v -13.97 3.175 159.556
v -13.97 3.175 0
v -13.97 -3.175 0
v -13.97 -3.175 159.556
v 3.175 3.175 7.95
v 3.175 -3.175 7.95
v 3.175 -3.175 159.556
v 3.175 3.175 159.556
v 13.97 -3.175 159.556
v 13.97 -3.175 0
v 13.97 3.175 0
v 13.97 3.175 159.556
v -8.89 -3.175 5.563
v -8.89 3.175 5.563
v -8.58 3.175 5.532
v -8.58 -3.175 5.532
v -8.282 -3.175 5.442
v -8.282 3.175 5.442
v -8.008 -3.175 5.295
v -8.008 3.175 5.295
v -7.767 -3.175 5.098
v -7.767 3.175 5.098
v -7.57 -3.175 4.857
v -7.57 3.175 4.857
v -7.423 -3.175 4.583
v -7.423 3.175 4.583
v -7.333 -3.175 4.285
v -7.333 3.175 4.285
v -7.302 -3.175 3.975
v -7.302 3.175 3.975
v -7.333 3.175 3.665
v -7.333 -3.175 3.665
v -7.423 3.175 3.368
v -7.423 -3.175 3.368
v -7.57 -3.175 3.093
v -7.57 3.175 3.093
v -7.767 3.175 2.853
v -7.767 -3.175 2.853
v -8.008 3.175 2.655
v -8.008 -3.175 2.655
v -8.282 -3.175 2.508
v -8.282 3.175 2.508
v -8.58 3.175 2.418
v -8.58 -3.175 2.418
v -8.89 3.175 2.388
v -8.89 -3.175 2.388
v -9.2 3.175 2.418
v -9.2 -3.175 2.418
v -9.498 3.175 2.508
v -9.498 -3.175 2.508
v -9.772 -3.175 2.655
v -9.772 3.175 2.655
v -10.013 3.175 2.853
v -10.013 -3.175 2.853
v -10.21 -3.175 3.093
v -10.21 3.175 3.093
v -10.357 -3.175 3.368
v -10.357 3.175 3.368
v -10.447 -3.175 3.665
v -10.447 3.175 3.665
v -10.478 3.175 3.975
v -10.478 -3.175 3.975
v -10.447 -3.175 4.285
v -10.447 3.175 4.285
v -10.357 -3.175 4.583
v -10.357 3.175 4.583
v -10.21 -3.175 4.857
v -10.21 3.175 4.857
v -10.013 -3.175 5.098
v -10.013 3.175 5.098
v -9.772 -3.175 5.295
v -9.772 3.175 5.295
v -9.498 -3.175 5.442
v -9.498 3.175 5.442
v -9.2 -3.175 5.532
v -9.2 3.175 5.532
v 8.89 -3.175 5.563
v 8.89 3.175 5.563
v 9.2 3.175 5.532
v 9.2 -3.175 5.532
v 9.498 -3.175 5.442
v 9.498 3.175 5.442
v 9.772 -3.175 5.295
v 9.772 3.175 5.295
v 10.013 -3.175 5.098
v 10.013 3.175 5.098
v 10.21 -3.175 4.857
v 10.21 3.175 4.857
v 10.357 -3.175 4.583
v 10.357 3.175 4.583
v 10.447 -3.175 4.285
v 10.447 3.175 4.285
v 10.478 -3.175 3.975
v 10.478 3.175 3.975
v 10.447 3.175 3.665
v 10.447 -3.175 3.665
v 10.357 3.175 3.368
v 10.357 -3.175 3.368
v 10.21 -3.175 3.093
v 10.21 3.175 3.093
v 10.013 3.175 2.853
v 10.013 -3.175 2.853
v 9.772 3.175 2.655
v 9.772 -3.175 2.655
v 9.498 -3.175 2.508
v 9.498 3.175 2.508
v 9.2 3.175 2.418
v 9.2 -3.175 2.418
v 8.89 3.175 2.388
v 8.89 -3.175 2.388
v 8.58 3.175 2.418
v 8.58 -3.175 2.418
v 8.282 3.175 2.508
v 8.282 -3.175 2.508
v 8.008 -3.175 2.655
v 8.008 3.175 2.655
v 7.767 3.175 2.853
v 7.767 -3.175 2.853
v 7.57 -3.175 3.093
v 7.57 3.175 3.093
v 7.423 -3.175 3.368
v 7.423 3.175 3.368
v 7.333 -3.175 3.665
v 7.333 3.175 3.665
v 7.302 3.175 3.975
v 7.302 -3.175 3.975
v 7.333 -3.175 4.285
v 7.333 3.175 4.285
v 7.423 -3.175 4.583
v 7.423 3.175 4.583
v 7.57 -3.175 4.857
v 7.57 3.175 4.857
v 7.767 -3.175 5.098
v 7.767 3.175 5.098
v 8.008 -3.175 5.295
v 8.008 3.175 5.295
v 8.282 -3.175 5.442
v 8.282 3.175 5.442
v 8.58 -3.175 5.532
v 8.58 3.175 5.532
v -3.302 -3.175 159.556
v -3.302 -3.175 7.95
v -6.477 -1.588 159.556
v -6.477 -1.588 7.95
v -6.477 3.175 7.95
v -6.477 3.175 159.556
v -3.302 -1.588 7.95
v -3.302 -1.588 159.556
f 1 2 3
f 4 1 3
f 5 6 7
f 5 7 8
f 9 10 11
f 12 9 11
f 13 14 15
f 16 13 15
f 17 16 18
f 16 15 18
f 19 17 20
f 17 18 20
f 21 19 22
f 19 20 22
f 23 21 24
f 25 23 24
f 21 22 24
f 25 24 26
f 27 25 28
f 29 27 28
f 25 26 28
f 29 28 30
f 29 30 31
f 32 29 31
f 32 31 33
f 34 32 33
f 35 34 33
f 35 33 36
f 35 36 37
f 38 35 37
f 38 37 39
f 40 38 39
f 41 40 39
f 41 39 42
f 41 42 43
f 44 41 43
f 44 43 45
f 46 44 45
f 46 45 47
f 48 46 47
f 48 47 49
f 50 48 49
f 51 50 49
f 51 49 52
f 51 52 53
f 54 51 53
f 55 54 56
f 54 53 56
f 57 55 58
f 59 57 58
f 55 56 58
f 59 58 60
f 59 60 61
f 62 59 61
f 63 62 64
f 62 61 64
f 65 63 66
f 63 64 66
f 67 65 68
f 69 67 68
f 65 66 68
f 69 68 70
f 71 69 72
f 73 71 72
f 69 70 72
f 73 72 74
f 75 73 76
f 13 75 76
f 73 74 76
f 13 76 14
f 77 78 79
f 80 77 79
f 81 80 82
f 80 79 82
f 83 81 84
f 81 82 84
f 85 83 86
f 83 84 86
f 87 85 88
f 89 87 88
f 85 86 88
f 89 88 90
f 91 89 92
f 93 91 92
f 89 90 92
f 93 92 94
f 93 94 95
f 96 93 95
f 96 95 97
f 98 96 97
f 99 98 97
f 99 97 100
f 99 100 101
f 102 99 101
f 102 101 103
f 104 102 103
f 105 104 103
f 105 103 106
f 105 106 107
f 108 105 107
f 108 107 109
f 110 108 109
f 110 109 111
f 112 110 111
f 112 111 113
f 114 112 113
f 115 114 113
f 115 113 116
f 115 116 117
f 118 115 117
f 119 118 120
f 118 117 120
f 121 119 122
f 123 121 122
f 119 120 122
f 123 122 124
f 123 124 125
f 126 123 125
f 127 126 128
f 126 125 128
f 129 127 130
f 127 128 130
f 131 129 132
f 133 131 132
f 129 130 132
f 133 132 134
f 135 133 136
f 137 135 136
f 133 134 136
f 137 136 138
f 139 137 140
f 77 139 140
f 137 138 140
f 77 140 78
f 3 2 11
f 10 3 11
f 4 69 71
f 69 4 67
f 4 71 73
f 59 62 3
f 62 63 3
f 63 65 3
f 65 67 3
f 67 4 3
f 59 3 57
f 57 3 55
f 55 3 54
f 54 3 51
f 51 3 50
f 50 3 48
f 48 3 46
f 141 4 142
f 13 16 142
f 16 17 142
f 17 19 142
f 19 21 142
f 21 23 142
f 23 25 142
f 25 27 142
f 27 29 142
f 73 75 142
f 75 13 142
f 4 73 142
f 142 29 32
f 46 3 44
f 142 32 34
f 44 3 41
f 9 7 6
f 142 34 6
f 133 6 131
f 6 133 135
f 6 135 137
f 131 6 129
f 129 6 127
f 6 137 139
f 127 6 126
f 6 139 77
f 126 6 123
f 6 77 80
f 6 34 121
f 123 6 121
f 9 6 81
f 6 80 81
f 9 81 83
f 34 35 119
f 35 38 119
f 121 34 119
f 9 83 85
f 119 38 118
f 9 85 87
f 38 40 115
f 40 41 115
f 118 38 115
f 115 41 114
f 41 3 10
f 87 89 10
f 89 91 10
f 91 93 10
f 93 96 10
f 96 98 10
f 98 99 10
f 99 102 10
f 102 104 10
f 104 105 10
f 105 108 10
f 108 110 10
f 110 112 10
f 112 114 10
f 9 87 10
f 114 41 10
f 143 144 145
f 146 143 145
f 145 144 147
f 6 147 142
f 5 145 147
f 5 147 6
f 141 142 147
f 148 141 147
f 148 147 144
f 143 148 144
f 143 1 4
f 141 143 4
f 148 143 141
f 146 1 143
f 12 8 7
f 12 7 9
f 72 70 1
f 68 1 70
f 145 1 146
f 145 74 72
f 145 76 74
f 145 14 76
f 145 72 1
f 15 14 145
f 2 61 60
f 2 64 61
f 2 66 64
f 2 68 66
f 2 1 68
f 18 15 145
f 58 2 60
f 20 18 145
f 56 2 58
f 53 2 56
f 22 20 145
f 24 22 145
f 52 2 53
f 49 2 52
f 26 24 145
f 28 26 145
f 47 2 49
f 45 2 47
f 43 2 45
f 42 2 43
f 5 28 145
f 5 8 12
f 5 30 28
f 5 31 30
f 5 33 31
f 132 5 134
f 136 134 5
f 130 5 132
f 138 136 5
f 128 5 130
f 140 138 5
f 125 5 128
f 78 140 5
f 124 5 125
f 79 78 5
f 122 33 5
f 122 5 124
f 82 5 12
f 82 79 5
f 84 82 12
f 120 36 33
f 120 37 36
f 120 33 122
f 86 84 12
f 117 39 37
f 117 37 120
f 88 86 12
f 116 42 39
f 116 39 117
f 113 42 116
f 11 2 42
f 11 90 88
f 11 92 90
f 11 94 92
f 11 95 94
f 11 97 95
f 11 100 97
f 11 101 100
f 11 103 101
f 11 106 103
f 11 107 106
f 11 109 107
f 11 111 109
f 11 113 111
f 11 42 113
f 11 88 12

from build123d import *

# Parameters (mm, degrees)
SKETCH1_W           = 27.94
SKETCH1_H           = 6.35
BOSS_EXTRUDE1_DEPTH = 7.9502
SKETCH2_W           = 10.795
SKETCH2_H           = 6.35
BOSS_EXTRUDE2_DEPTH = 151.60625
SKETCH4_R           = 1.5875
CUT_EXTRUDE1_DEPTH  = 161.292682729


with BuildPart() as part:
    # Sketch1 → Boss-Extrude1 (new body)
    with BuildSketch(Plane.XY):
        Rectangle(SKETCH1_W, SKETCH1_H)
    extrude(amount=BOSS_EXTRUDE1_DEPTH)

    # Sketch2 → Boss-Extrude2 (add)
    with BuildSketch(Plane.XY.offset(7.9502)):
        Polygon((-3.302, -3.175), (-3.302, -1.5875), (-6.477, -1.5875), (-6.477, 3.175), (-13.97, 3.175), (-13.97, -3.175), align=None)
        with Locations((8.5725, 0)):
            Rectangle(SKETCH2_W, SKETCH2_H)
    extrude(amount=BOSS_EXTRUDE2_DEPTH)

    # Sketch4 → Cut-Extrude1 (cut, through all)
    with BuildSketch(Plane(origin=(0, 3.175, 0), x_dir=(1, 0, 0), z_dir=(0, 1, 0))):
        with Locations(Location((-8.89, -3.9751, 0), (0, 0, 270))):
            Circle(SKETCH4_R)
        with Locations(Location((8.89, -3.9751, 0), (0, 0, 270))):
            Circle(SKETCH4_R)
    extrude(amount=-CUT_EXTRUDE1_DEPTH, mode=Mode.SUBTRACT)


solid = part.part
